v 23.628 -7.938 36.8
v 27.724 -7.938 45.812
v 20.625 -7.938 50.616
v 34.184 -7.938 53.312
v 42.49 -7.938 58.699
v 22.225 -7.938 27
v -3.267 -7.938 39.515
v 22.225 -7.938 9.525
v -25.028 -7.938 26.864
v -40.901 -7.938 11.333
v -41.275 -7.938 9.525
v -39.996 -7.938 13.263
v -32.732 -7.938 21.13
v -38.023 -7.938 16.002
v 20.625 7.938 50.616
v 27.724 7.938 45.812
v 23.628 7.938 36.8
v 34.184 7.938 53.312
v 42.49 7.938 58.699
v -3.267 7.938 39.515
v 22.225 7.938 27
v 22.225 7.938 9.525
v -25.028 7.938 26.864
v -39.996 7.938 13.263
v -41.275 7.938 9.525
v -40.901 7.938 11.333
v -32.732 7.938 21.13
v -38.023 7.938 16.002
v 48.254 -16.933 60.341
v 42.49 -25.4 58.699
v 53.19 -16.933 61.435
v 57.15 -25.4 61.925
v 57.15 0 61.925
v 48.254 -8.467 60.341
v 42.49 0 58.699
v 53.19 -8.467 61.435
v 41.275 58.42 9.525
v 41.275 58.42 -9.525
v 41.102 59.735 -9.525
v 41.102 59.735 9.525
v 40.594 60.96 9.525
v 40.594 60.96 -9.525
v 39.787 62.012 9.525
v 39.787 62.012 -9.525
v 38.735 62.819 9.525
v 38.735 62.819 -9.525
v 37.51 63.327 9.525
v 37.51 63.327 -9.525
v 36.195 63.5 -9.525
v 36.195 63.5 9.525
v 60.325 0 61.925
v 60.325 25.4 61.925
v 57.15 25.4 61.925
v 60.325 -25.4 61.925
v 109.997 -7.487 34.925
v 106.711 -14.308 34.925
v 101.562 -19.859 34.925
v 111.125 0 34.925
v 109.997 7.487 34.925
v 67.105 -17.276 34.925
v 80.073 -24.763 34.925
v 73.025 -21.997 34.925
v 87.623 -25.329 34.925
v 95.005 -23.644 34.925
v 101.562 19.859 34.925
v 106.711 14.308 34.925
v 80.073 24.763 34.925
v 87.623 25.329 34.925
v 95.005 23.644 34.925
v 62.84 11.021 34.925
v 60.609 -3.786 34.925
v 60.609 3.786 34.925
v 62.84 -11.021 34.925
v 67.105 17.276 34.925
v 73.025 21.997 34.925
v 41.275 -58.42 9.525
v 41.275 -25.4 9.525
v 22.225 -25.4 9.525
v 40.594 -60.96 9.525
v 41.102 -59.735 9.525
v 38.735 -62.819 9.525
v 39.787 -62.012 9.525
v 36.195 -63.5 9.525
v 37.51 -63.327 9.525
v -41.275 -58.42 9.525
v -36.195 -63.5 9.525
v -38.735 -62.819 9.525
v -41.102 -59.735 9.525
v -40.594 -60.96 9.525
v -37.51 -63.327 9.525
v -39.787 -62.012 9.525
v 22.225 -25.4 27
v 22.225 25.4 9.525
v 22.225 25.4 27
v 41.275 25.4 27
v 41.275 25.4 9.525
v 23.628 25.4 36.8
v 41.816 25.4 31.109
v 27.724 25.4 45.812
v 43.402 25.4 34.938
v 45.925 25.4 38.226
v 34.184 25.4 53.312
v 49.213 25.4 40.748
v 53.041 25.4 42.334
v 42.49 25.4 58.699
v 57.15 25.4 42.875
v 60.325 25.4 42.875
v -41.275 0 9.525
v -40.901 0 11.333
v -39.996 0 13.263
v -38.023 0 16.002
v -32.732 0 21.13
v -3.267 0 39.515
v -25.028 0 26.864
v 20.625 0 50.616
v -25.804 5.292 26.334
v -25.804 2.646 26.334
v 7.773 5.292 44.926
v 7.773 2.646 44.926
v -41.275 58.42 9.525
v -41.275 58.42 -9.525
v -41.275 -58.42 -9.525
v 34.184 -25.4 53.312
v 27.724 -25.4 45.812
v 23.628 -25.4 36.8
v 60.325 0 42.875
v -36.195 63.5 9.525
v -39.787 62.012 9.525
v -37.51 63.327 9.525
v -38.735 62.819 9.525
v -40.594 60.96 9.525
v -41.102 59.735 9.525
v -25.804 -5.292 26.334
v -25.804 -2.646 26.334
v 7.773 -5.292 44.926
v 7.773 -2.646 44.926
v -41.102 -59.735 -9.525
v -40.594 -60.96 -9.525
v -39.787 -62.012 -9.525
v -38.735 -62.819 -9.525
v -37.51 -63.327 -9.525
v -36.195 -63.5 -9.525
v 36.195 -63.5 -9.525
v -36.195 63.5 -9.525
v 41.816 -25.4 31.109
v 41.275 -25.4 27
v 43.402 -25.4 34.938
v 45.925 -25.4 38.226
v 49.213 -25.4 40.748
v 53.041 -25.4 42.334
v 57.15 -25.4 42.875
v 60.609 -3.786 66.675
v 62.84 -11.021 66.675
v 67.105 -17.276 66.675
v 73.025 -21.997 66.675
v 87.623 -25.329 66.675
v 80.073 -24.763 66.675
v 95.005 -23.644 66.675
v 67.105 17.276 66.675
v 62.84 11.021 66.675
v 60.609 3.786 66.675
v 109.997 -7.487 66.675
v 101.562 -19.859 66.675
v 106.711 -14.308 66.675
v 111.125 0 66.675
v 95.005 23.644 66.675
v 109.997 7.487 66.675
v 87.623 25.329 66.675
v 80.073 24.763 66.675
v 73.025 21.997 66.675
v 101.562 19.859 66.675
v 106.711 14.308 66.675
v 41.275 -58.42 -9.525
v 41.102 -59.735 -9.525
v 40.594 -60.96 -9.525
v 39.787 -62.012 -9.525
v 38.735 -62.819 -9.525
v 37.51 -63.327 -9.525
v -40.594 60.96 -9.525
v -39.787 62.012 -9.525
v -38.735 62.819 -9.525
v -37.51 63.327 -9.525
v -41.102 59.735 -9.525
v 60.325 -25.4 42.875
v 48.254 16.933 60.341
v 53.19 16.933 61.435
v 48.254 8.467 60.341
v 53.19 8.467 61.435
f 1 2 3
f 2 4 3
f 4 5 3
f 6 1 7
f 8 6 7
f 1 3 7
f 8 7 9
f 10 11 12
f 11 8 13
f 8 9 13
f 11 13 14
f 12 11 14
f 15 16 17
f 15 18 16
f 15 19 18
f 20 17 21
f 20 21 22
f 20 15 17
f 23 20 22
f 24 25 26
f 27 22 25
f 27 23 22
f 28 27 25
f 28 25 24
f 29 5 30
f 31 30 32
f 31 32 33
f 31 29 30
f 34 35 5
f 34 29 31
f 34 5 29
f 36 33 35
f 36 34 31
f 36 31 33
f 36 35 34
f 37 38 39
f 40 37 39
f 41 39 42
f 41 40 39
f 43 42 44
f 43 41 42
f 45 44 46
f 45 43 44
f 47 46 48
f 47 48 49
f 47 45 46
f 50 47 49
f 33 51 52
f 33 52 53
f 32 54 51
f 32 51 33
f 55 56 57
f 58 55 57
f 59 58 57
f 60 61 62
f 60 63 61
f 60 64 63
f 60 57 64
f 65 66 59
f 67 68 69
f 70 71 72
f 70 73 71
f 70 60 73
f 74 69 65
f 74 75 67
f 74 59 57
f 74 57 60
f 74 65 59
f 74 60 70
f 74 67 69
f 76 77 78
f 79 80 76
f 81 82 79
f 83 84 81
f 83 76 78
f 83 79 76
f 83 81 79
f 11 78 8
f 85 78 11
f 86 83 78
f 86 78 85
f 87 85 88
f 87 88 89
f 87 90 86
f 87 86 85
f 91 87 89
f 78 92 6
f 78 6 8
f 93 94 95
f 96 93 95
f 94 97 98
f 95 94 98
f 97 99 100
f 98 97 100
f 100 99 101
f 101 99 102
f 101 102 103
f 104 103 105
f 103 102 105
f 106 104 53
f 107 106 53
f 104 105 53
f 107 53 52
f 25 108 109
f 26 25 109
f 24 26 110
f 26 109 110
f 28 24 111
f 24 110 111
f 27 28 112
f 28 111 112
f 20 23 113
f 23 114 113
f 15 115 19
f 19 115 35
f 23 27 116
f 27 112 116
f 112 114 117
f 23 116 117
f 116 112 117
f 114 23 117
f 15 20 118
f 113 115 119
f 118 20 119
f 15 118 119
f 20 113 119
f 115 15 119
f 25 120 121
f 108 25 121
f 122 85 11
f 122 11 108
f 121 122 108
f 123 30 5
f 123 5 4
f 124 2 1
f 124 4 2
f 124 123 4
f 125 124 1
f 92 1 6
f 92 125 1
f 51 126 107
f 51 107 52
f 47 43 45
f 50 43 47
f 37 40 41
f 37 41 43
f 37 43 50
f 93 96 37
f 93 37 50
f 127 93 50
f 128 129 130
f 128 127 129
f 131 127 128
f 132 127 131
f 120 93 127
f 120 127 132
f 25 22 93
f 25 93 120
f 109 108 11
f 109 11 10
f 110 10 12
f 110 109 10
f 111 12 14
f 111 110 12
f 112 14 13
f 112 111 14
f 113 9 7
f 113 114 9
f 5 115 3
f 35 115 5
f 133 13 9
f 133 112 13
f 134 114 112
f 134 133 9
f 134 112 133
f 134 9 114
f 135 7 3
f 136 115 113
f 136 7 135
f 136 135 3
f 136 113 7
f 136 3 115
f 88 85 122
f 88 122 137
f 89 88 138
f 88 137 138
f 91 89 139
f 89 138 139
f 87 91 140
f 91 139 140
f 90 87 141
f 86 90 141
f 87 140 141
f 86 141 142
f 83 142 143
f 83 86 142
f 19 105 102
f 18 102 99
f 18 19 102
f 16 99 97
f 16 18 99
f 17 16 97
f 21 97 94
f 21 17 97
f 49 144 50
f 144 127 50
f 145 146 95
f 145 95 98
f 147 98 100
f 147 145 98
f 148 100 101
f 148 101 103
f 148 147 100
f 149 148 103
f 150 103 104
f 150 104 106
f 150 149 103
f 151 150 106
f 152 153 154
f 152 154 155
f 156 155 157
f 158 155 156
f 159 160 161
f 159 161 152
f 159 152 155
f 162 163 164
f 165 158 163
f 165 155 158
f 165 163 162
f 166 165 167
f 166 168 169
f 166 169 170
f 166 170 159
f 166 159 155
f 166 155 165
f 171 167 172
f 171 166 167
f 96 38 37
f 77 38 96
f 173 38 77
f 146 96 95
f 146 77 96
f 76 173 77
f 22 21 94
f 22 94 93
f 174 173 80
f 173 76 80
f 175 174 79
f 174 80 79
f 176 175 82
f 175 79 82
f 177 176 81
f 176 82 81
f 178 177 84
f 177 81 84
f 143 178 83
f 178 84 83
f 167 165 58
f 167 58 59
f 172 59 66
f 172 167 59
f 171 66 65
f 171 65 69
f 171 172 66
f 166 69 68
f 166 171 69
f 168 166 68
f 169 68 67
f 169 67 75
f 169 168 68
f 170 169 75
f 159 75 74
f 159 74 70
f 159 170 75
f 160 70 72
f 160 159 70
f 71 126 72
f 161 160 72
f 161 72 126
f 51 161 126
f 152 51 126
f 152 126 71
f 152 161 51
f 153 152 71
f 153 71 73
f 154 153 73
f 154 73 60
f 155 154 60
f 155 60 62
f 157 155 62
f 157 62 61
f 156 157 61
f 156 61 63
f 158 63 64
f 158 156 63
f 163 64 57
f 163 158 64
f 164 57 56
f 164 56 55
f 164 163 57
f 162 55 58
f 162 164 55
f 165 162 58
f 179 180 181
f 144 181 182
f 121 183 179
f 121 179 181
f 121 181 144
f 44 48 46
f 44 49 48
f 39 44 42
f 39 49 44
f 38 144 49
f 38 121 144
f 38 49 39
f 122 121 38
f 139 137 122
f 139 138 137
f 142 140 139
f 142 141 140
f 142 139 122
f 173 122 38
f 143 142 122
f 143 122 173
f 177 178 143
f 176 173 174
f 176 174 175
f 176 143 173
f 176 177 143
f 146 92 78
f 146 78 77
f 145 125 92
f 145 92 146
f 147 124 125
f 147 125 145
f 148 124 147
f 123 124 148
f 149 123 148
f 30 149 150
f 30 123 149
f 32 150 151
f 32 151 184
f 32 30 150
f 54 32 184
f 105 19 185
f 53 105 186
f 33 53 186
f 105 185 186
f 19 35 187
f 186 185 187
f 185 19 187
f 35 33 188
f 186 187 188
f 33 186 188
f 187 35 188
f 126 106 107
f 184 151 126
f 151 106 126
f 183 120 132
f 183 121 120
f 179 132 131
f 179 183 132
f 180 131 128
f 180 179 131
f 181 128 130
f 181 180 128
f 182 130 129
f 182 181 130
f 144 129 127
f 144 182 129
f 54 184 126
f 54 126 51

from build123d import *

# Parameters (mm, degrees)
F1_DEPTH = 63.5
F2_DEPTH = 25.4
F3_DEPTH = 7.9375
F5_R     = 5.08


with BuildPart() as f1:
    # F0 (on Front) → F1 (new body, symmetric)
    with BuildSketch(Plane.XZ):
        Polygon((22.225, 9.525), (-41.275, 9.525), (-41.275, -9.525), (41.275, -9.525), (41.275, 9.525), align=None)
    extrude(amount=F1_DEPTH, both=True)

    # F0 (on Front) → F2 (join, symmetric)
    with BuildSketch(Plane.XZ):
        with BuildLine():
            Line((22.225, 27.0002), (22.225, 9.525))
            Line((22.225, 9.525), (41.275, 9.525))
            Line((41.275, 9.525), (41.275, 27.0002))
            ThreePointArc((41.275, 27.0002), (45.9246798487, 38.2255201513), (57.15, 42.8752))
            Line((57.15, 42.8752), (60.325, 42.8752))
            Line((60.325, 42.8752), (60.325, 61.9252))
            Line((60.325, 61.9252), (57.15, 61.9252))
            add(Edge.make_bspline(
                [(42.4895522305, 58.6992046563), (48.6170355167, 60.5945531062), (53.7289755216, 61.7574445531), (57.15, 61.9252)],
                knots=[92.3964918241, 92.3964918241, 92.3964918241, 92.3964918241, 111.5045361635, 111.5045361635, 111.5045361635, 111.5045361635], degree=3))
            ThreePointArc((42.4895522305, 58.6992046563), (27.724061074, 45.8116258717), (22.225, 27.0002))
        make_face()
    extrude(amount=F2_DEPTH, both=True)

    # F0 (on Front) → F3 (join, symmetric)
    with BuildSketch(Plane.XZ):
        with BuildLine():
            add(Edge.make_bspline(
                [(-41.275, 9.525), (-40.5143053144, 23.2431958574), (12.8602532142, 49.5342925152), (42.4895522305, 58.6992046563)],
                knots=[0, 0, 0, 0, 92.3964918241, 92.3964918241, 92.3964918241, 92.3964918241], degree=3))
            Line((-41.275, 9.525), (22.225, 9.525))
            Line((22.225, 9.525), (22.225, 27.0002))
            ThreePointArc((22.225, 27.0002), (27.724061074, 45.8116258717), (42.4895522305, 58.6992046563))
        make_face()
    extrude(amount=F3_DEPTH, both=True)

    # F0 (on Front) → F4 (revolve)
    with BuildSketch(Plane.XZ):
        Polygon((85.725, 66.675), (85.725, 61.9252), (85.725, 42.8752), (85.725, 34.925), (111.125, 34.925), (111.125, 66.675), align=None)
    revolve(axis=Axis((85.725, 0, 50.8), (0, 0, 1)))

    # F5
    f5_edges = [f1.edges().sort_by_distance(p)[0] for p in [
        (-41.275, -63.5, 0),
        (41.275, -63.5, 0),
        (-41.275, 63.5, 0),
        (41.275, 63.5, 0),
    ]]
    fillet(f5_edges, radius=F5_R)


solid = f1.part
